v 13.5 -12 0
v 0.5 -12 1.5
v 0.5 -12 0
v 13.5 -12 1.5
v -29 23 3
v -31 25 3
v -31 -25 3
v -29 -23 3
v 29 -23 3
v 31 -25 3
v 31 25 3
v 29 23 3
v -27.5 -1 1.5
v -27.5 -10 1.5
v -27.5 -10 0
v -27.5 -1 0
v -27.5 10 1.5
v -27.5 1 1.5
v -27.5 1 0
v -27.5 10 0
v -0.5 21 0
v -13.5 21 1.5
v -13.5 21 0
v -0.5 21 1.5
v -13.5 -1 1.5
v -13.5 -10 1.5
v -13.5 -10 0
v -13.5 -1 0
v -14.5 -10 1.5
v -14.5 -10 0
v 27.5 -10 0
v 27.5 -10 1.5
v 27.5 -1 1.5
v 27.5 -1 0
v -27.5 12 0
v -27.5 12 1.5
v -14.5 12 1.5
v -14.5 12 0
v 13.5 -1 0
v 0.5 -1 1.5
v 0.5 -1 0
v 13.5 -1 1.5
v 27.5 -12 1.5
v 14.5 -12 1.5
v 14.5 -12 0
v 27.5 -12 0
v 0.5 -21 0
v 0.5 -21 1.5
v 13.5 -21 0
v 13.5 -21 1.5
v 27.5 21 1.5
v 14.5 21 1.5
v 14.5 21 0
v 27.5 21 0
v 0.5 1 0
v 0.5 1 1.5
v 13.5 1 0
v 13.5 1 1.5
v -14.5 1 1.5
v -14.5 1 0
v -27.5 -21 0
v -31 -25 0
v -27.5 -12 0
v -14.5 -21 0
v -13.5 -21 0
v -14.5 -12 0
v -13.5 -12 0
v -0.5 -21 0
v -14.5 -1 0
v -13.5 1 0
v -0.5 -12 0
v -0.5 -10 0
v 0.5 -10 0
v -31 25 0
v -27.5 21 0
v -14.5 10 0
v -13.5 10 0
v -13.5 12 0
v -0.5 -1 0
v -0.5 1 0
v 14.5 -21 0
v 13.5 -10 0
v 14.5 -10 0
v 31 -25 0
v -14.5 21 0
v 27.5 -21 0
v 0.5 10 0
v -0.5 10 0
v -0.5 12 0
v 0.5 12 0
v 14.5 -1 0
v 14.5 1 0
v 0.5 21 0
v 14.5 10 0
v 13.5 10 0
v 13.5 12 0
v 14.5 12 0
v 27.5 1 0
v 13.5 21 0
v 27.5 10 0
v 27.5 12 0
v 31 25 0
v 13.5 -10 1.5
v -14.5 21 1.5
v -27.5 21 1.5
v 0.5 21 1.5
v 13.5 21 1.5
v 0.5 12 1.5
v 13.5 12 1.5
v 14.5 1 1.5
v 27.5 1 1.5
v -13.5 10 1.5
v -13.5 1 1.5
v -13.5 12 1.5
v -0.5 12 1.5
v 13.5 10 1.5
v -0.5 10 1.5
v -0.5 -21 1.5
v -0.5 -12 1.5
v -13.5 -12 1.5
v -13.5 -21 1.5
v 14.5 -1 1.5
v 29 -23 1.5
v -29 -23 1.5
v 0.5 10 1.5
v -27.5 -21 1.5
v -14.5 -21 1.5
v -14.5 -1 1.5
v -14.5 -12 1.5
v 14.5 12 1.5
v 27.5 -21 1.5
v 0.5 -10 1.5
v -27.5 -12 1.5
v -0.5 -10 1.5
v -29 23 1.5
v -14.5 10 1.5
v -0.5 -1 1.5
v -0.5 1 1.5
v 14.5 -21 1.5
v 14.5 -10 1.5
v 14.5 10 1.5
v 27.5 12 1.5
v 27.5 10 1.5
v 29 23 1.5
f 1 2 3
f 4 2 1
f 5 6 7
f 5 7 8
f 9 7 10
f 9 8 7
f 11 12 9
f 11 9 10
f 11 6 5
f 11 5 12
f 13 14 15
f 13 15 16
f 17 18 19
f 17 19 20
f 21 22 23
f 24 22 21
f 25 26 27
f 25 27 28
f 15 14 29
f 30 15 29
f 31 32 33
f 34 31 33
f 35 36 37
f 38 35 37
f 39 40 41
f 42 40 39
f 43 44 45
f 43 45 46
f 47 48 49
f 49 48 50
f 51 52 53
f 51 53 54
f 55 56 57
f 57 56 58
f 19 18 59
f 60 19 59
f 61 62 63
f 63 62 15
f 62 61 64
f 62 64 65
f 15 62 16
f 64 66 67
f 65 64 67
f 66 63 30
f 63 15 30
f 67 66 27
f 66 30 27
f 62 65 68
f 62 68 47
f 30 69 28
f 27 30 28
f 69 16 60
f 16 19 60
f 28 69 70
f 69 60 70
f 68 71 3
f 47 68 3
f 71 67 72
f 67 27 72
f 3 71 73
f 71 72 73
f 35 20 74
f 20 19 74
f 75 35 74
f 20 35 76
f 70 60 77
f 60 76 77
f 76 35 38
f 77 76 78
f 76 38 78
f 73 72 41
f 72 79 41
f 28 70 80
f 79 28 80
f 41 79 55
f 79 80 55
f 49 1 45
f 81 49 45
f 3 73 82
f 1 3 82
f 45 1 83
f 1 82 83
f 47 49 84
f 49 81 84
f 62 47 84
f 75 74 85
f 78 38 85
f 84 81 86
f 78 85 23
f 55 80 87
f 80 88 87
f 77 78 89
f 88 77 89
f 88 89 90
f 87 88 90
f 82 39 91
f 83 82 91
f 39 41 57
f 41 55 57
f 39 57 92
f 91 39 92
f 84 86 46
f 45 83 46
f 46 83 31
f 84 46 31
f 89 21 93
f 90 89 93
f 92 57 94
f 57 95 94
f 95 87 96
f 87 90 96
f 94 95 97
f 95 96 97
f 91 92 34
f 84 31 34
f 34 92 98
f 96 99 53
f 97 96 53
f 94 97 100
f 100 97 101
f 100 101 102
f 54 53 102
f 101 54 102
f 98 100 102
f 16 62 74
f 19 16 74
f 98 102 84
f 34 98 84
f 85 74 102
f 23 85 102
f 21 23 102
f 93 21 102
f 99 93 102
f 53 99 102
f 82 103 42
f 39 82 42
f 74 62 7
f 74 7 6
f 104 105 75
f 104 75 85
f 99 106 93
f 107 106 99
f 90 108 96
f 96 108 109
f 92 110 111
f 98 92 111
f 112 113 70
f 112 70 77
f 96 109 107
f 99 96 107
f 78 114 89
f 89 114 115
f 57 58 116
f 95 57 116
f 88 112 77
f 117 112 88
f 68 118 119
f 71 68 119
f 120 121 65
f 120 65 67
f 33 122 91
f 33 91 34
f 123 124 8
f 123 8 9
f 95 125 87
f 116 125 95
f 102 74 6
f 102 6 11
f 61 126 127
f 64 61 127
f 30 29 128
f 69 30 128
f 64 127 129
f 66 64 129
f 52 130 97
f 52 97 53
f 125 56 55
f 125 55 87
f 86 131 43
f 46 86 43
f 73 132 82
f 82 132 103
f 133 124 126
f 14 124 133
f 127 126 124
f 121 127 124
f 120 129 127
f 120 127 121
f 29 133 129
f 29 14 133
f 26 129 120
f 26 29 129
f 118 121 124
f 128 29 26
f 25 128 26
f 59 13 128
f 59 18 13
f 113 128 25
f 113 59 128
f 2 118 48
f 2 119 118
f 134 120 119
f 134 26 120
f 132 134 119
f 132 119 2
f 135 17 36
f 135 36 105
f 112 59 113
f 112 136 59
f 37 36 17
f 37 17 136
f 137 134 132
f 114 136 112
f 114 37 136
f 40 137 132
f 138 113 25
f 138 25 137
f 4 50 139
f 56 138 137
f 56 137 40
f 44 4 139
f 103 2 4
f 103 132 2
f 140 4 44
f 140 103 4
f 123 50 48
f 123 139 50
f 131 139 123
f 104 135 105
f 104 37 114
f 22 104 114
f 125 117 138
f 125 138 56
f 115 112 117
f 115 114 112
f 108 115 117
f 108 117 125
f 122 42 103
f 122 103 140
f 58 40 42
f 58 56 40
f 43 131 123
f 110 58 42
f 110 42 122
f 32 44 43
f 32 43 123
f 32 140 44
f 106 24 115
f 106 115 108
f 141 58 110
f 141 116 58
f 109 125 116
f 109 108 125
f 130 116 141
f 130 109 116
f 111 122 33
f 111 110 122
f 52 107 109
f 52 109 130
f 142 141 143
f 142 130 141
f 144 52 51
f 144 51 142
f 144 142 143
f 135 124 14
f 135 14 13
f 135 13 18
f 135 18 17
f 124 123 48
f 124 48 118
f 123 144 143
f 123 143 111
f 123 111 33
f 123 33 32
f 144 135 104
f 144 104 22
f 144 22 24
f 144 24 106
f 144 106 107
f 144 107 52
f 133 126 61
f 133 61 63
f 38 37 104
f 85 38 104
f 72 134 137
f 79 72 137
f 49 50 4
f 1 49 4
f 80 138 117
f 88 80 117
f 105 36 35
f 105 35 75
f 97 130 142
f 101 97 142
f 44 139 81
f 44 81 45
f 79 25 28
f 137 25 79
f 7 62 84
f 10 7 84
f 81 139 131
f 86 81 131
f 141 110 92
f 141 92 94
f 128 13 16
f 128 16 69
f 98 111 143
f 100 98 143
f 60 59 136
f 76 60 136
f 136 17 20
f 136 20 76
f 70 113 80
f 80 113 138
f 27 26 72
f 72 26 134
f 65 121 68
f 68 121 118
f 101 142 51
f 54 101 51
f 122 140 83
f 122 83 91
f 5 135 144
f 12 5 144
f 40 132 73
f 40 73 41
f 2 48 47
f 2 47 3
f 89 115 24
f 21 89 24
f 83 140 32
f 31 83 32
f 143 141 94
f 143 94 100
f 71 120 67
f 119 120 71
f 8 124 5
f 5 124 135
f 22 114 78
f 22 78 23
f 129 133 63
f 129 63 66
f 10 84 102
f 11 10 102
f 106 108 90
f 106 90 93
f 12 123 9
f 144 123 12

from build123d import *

# Parameters (mm, degrees)
F0_W     = 58
F0_H     = 46
F1_DEPTH = 1.5
F2_W     = 11
F2_H     = 7
F3_DEPTH = 1.501
F4_W     = 13
F4_H     = 9
F4_W_2   = 11
F4_H_2   = 7
F5_DEPTH = 1.501
F0_W_2   = 62
F0_H_2   = 50
F6_DEPTH = 3


with BuildPart() as f1:
    # F0 (on Top) → F1 (new body)
    with BuildSketch(Plane.XY):
        Rectangle(F0_W, F0_H)
    extrude(amount=F1_DEPTH)

    # F2 (on face) → F3 (cut, through all)
    with BuildSketch(Plane.XY.offset(1.5)):
        with Locations((-21, 16.5)):
            Rectangle(F2_W, F2_H)
        with Locations((-7, 16.5)):
            Rectangle(F2_W, F2_H)
        with Locations((7, 16.5)):
            Rectangle(F2_W, F2_H)
        with Locations((21, 16.5)):
            Rectangle(F2_W, F2_H)
        with Locations((-20.923837, 5.500264)):
            Rectangle(F2_W, F2_H)
        with Locations((-6.923837, 5.500264)):
            Rectangle(F2_W, F2_H)
        with Locations((7.076163, 5.500264)):
            Rectangle(F2_W, F2_H)
        with Locations((21.076163, 5.500264)):
            Rectangle(F2_W, F2_H)
        with Locations((-20.847673, -5.499473)):
            Rectangle(F2_W, F2_H)
        with Locations((-6.847673, -5.499473)):
            Rectangle(F2_W, F2_H)
        with Locations((7.152327, -5.499473)):
            Rectangle(F2_W, F2_H)
        with Locations((21.152327, -5.499473)):
            Rectangle(F2_W, F2_H)
        with Locations((-20.77151, -16.499209)):
            Rectangle(F2_W, F2_H)
        with Locations((-6.77151, -16.499209)):
            Rectangle(F2_W, F2_H)
        with Locations((7.22849, -16.499209)):
            Rectangle(F2_W, F2_H)
        with Locations((21.22849, -16.499209)):
            Rectangle(F2_W, F2_H)
    extrude(amount=-F3_DEPTH, mode=Mode.SUBTRACT)

    # F4 (on face) → F5 (cut, through all)
    with BuildSketch(Plane.XY.offset(1.5)):
        with Locations((-21, 16.5)):
            Rectangle(F4_W, F4_H)
        with Locations((-21, 16.5)):
            Rectangle(F4_W_2, F4_H_2, mode=Mode.SUBTRACT)
        with Locations((-7, 16.5)):
            Rectangle(F4_W, F4_H)
        with Locations((-7, 16.5)):
            Rectangle(F4_W_2, F4_H_2, mode=Mode.SUBTRACT)
        with Locations((7, 16.5)):
            Rectangle(F4_W, F4_H)
        with Locations((7, 16.5)):
            Rectangle(F4_W_2, F4_H_2, mode=Mode.SUBTRACT)
        with Locations((21, 16.5)):
            Rectangle(F4_W, F4_H)
        with Locations((21, 16.5)):
            Rectangle(F4_W_2, F4_H_2, mode=Mode.SUBTRACT)
        with Locations((-21, 5.5)):
            Rectangle(F4_W, F4_H)
        with Locations((-20.923837, 5.500264)):
            Rectangle(F4_W_2, F4_H_2, mode=Mode.SUBTRACT)
        with Locations((7, 5.5)):
            Rectangle(F4_W, F4_H)
        with Locations((7.076163, 5.500264)):
            Rectangle(F4_W_2, F4_H_2, mode=Mode.SUBTRACT)
        with Locations((-7, 5.5)):
            Rectangle(F4_W, F4_H)
        with Locations((-6.923837, 5.500264)):
            Rectangle(F4_W_2, F4_H_2, mode=Mode.SUBTRACT)
        with Locations((21, 5.5)):
            Rectangle(F4_W, F4_H)
        with Locations((21.076163, 5.500264)):
            Rectangle(F4_W_2, F4_H_2, mode=Mode.SUBTRACT)
        with Locations((-21, -5.5)):
            Rectangle(F4_W, F4_H)
        with Locations((-20.847673, -5.499473)):
            Rectangle(F4_W_2, F4_H_2, mode=Mode.SUBTRACT)
        with Locations((-7, -5.5)):
            Rectangle(F4_W, F4_H)
        with Locations((-6.847673, -5.499473)):
            Rectangle(F4_W_2, F4_H_2, mode=Mode.SUBTRACT)
        with Locations((7, -5.5)):
            Rectangle(F4_W, F4_H)
        with Locations((7.152327, -5.499473)):
            Rectangle(F4_W_2, F4_H_2, mode=Mode.SUBTRACT)
        with Locations((21, -5.5)):
            Rectangle(F4_W, F4_H)
        with Locations((21.152327, -5.499473)):
            Rectangle(F4_W_2, F4_H_2, mode=Mode.SUBTRACT)
        with Locations((-21, -16.5)):
            Rectangle(F4_W, F4_H)
        with Locations((-20.77151, -16.499209)):
            Rectangle(F4_W_2, F4_H_2, mode=Mode.SUBTRACT)
        with Locations((-7, -16.5)):
            Rectangle(F4_W, F4_H)
        with Locations((-6.77151, -16.499209)):
            Rectangle(F4_W_2, F4_H_2, mode=Mode.SUBTRACT)
        with Locations((7, -16.5)):
            Rectangle(F4_W, F4_H)
        with Locations((7.22849, -16.499209)):
            Rectangle(F4_W_2, F4_H_2, mode=Mode.SUBTRACT)
        with Locations((21, -16.5)):
            Rectangle(F4_W, F4_H)
        with Locations((21.22849, -16.499209)):
            Rectangle(F4_W_2, F4_H_2, mode=Mode.SUBTRACT)
    extrude(amount=-F5_DEPTH, mode=Mode.SUBTRACT)

    # F0 (on Top) → F6 (join)
    with BuildSketch(Plane.XY):
        Rectangle(F0_W_2, F0_H_2)
        Rectangle(F0_W, F0_H, mode=Mode.SUBTRACT)
    extrude(amount=F6_DEPTH)


solid = f1.part
